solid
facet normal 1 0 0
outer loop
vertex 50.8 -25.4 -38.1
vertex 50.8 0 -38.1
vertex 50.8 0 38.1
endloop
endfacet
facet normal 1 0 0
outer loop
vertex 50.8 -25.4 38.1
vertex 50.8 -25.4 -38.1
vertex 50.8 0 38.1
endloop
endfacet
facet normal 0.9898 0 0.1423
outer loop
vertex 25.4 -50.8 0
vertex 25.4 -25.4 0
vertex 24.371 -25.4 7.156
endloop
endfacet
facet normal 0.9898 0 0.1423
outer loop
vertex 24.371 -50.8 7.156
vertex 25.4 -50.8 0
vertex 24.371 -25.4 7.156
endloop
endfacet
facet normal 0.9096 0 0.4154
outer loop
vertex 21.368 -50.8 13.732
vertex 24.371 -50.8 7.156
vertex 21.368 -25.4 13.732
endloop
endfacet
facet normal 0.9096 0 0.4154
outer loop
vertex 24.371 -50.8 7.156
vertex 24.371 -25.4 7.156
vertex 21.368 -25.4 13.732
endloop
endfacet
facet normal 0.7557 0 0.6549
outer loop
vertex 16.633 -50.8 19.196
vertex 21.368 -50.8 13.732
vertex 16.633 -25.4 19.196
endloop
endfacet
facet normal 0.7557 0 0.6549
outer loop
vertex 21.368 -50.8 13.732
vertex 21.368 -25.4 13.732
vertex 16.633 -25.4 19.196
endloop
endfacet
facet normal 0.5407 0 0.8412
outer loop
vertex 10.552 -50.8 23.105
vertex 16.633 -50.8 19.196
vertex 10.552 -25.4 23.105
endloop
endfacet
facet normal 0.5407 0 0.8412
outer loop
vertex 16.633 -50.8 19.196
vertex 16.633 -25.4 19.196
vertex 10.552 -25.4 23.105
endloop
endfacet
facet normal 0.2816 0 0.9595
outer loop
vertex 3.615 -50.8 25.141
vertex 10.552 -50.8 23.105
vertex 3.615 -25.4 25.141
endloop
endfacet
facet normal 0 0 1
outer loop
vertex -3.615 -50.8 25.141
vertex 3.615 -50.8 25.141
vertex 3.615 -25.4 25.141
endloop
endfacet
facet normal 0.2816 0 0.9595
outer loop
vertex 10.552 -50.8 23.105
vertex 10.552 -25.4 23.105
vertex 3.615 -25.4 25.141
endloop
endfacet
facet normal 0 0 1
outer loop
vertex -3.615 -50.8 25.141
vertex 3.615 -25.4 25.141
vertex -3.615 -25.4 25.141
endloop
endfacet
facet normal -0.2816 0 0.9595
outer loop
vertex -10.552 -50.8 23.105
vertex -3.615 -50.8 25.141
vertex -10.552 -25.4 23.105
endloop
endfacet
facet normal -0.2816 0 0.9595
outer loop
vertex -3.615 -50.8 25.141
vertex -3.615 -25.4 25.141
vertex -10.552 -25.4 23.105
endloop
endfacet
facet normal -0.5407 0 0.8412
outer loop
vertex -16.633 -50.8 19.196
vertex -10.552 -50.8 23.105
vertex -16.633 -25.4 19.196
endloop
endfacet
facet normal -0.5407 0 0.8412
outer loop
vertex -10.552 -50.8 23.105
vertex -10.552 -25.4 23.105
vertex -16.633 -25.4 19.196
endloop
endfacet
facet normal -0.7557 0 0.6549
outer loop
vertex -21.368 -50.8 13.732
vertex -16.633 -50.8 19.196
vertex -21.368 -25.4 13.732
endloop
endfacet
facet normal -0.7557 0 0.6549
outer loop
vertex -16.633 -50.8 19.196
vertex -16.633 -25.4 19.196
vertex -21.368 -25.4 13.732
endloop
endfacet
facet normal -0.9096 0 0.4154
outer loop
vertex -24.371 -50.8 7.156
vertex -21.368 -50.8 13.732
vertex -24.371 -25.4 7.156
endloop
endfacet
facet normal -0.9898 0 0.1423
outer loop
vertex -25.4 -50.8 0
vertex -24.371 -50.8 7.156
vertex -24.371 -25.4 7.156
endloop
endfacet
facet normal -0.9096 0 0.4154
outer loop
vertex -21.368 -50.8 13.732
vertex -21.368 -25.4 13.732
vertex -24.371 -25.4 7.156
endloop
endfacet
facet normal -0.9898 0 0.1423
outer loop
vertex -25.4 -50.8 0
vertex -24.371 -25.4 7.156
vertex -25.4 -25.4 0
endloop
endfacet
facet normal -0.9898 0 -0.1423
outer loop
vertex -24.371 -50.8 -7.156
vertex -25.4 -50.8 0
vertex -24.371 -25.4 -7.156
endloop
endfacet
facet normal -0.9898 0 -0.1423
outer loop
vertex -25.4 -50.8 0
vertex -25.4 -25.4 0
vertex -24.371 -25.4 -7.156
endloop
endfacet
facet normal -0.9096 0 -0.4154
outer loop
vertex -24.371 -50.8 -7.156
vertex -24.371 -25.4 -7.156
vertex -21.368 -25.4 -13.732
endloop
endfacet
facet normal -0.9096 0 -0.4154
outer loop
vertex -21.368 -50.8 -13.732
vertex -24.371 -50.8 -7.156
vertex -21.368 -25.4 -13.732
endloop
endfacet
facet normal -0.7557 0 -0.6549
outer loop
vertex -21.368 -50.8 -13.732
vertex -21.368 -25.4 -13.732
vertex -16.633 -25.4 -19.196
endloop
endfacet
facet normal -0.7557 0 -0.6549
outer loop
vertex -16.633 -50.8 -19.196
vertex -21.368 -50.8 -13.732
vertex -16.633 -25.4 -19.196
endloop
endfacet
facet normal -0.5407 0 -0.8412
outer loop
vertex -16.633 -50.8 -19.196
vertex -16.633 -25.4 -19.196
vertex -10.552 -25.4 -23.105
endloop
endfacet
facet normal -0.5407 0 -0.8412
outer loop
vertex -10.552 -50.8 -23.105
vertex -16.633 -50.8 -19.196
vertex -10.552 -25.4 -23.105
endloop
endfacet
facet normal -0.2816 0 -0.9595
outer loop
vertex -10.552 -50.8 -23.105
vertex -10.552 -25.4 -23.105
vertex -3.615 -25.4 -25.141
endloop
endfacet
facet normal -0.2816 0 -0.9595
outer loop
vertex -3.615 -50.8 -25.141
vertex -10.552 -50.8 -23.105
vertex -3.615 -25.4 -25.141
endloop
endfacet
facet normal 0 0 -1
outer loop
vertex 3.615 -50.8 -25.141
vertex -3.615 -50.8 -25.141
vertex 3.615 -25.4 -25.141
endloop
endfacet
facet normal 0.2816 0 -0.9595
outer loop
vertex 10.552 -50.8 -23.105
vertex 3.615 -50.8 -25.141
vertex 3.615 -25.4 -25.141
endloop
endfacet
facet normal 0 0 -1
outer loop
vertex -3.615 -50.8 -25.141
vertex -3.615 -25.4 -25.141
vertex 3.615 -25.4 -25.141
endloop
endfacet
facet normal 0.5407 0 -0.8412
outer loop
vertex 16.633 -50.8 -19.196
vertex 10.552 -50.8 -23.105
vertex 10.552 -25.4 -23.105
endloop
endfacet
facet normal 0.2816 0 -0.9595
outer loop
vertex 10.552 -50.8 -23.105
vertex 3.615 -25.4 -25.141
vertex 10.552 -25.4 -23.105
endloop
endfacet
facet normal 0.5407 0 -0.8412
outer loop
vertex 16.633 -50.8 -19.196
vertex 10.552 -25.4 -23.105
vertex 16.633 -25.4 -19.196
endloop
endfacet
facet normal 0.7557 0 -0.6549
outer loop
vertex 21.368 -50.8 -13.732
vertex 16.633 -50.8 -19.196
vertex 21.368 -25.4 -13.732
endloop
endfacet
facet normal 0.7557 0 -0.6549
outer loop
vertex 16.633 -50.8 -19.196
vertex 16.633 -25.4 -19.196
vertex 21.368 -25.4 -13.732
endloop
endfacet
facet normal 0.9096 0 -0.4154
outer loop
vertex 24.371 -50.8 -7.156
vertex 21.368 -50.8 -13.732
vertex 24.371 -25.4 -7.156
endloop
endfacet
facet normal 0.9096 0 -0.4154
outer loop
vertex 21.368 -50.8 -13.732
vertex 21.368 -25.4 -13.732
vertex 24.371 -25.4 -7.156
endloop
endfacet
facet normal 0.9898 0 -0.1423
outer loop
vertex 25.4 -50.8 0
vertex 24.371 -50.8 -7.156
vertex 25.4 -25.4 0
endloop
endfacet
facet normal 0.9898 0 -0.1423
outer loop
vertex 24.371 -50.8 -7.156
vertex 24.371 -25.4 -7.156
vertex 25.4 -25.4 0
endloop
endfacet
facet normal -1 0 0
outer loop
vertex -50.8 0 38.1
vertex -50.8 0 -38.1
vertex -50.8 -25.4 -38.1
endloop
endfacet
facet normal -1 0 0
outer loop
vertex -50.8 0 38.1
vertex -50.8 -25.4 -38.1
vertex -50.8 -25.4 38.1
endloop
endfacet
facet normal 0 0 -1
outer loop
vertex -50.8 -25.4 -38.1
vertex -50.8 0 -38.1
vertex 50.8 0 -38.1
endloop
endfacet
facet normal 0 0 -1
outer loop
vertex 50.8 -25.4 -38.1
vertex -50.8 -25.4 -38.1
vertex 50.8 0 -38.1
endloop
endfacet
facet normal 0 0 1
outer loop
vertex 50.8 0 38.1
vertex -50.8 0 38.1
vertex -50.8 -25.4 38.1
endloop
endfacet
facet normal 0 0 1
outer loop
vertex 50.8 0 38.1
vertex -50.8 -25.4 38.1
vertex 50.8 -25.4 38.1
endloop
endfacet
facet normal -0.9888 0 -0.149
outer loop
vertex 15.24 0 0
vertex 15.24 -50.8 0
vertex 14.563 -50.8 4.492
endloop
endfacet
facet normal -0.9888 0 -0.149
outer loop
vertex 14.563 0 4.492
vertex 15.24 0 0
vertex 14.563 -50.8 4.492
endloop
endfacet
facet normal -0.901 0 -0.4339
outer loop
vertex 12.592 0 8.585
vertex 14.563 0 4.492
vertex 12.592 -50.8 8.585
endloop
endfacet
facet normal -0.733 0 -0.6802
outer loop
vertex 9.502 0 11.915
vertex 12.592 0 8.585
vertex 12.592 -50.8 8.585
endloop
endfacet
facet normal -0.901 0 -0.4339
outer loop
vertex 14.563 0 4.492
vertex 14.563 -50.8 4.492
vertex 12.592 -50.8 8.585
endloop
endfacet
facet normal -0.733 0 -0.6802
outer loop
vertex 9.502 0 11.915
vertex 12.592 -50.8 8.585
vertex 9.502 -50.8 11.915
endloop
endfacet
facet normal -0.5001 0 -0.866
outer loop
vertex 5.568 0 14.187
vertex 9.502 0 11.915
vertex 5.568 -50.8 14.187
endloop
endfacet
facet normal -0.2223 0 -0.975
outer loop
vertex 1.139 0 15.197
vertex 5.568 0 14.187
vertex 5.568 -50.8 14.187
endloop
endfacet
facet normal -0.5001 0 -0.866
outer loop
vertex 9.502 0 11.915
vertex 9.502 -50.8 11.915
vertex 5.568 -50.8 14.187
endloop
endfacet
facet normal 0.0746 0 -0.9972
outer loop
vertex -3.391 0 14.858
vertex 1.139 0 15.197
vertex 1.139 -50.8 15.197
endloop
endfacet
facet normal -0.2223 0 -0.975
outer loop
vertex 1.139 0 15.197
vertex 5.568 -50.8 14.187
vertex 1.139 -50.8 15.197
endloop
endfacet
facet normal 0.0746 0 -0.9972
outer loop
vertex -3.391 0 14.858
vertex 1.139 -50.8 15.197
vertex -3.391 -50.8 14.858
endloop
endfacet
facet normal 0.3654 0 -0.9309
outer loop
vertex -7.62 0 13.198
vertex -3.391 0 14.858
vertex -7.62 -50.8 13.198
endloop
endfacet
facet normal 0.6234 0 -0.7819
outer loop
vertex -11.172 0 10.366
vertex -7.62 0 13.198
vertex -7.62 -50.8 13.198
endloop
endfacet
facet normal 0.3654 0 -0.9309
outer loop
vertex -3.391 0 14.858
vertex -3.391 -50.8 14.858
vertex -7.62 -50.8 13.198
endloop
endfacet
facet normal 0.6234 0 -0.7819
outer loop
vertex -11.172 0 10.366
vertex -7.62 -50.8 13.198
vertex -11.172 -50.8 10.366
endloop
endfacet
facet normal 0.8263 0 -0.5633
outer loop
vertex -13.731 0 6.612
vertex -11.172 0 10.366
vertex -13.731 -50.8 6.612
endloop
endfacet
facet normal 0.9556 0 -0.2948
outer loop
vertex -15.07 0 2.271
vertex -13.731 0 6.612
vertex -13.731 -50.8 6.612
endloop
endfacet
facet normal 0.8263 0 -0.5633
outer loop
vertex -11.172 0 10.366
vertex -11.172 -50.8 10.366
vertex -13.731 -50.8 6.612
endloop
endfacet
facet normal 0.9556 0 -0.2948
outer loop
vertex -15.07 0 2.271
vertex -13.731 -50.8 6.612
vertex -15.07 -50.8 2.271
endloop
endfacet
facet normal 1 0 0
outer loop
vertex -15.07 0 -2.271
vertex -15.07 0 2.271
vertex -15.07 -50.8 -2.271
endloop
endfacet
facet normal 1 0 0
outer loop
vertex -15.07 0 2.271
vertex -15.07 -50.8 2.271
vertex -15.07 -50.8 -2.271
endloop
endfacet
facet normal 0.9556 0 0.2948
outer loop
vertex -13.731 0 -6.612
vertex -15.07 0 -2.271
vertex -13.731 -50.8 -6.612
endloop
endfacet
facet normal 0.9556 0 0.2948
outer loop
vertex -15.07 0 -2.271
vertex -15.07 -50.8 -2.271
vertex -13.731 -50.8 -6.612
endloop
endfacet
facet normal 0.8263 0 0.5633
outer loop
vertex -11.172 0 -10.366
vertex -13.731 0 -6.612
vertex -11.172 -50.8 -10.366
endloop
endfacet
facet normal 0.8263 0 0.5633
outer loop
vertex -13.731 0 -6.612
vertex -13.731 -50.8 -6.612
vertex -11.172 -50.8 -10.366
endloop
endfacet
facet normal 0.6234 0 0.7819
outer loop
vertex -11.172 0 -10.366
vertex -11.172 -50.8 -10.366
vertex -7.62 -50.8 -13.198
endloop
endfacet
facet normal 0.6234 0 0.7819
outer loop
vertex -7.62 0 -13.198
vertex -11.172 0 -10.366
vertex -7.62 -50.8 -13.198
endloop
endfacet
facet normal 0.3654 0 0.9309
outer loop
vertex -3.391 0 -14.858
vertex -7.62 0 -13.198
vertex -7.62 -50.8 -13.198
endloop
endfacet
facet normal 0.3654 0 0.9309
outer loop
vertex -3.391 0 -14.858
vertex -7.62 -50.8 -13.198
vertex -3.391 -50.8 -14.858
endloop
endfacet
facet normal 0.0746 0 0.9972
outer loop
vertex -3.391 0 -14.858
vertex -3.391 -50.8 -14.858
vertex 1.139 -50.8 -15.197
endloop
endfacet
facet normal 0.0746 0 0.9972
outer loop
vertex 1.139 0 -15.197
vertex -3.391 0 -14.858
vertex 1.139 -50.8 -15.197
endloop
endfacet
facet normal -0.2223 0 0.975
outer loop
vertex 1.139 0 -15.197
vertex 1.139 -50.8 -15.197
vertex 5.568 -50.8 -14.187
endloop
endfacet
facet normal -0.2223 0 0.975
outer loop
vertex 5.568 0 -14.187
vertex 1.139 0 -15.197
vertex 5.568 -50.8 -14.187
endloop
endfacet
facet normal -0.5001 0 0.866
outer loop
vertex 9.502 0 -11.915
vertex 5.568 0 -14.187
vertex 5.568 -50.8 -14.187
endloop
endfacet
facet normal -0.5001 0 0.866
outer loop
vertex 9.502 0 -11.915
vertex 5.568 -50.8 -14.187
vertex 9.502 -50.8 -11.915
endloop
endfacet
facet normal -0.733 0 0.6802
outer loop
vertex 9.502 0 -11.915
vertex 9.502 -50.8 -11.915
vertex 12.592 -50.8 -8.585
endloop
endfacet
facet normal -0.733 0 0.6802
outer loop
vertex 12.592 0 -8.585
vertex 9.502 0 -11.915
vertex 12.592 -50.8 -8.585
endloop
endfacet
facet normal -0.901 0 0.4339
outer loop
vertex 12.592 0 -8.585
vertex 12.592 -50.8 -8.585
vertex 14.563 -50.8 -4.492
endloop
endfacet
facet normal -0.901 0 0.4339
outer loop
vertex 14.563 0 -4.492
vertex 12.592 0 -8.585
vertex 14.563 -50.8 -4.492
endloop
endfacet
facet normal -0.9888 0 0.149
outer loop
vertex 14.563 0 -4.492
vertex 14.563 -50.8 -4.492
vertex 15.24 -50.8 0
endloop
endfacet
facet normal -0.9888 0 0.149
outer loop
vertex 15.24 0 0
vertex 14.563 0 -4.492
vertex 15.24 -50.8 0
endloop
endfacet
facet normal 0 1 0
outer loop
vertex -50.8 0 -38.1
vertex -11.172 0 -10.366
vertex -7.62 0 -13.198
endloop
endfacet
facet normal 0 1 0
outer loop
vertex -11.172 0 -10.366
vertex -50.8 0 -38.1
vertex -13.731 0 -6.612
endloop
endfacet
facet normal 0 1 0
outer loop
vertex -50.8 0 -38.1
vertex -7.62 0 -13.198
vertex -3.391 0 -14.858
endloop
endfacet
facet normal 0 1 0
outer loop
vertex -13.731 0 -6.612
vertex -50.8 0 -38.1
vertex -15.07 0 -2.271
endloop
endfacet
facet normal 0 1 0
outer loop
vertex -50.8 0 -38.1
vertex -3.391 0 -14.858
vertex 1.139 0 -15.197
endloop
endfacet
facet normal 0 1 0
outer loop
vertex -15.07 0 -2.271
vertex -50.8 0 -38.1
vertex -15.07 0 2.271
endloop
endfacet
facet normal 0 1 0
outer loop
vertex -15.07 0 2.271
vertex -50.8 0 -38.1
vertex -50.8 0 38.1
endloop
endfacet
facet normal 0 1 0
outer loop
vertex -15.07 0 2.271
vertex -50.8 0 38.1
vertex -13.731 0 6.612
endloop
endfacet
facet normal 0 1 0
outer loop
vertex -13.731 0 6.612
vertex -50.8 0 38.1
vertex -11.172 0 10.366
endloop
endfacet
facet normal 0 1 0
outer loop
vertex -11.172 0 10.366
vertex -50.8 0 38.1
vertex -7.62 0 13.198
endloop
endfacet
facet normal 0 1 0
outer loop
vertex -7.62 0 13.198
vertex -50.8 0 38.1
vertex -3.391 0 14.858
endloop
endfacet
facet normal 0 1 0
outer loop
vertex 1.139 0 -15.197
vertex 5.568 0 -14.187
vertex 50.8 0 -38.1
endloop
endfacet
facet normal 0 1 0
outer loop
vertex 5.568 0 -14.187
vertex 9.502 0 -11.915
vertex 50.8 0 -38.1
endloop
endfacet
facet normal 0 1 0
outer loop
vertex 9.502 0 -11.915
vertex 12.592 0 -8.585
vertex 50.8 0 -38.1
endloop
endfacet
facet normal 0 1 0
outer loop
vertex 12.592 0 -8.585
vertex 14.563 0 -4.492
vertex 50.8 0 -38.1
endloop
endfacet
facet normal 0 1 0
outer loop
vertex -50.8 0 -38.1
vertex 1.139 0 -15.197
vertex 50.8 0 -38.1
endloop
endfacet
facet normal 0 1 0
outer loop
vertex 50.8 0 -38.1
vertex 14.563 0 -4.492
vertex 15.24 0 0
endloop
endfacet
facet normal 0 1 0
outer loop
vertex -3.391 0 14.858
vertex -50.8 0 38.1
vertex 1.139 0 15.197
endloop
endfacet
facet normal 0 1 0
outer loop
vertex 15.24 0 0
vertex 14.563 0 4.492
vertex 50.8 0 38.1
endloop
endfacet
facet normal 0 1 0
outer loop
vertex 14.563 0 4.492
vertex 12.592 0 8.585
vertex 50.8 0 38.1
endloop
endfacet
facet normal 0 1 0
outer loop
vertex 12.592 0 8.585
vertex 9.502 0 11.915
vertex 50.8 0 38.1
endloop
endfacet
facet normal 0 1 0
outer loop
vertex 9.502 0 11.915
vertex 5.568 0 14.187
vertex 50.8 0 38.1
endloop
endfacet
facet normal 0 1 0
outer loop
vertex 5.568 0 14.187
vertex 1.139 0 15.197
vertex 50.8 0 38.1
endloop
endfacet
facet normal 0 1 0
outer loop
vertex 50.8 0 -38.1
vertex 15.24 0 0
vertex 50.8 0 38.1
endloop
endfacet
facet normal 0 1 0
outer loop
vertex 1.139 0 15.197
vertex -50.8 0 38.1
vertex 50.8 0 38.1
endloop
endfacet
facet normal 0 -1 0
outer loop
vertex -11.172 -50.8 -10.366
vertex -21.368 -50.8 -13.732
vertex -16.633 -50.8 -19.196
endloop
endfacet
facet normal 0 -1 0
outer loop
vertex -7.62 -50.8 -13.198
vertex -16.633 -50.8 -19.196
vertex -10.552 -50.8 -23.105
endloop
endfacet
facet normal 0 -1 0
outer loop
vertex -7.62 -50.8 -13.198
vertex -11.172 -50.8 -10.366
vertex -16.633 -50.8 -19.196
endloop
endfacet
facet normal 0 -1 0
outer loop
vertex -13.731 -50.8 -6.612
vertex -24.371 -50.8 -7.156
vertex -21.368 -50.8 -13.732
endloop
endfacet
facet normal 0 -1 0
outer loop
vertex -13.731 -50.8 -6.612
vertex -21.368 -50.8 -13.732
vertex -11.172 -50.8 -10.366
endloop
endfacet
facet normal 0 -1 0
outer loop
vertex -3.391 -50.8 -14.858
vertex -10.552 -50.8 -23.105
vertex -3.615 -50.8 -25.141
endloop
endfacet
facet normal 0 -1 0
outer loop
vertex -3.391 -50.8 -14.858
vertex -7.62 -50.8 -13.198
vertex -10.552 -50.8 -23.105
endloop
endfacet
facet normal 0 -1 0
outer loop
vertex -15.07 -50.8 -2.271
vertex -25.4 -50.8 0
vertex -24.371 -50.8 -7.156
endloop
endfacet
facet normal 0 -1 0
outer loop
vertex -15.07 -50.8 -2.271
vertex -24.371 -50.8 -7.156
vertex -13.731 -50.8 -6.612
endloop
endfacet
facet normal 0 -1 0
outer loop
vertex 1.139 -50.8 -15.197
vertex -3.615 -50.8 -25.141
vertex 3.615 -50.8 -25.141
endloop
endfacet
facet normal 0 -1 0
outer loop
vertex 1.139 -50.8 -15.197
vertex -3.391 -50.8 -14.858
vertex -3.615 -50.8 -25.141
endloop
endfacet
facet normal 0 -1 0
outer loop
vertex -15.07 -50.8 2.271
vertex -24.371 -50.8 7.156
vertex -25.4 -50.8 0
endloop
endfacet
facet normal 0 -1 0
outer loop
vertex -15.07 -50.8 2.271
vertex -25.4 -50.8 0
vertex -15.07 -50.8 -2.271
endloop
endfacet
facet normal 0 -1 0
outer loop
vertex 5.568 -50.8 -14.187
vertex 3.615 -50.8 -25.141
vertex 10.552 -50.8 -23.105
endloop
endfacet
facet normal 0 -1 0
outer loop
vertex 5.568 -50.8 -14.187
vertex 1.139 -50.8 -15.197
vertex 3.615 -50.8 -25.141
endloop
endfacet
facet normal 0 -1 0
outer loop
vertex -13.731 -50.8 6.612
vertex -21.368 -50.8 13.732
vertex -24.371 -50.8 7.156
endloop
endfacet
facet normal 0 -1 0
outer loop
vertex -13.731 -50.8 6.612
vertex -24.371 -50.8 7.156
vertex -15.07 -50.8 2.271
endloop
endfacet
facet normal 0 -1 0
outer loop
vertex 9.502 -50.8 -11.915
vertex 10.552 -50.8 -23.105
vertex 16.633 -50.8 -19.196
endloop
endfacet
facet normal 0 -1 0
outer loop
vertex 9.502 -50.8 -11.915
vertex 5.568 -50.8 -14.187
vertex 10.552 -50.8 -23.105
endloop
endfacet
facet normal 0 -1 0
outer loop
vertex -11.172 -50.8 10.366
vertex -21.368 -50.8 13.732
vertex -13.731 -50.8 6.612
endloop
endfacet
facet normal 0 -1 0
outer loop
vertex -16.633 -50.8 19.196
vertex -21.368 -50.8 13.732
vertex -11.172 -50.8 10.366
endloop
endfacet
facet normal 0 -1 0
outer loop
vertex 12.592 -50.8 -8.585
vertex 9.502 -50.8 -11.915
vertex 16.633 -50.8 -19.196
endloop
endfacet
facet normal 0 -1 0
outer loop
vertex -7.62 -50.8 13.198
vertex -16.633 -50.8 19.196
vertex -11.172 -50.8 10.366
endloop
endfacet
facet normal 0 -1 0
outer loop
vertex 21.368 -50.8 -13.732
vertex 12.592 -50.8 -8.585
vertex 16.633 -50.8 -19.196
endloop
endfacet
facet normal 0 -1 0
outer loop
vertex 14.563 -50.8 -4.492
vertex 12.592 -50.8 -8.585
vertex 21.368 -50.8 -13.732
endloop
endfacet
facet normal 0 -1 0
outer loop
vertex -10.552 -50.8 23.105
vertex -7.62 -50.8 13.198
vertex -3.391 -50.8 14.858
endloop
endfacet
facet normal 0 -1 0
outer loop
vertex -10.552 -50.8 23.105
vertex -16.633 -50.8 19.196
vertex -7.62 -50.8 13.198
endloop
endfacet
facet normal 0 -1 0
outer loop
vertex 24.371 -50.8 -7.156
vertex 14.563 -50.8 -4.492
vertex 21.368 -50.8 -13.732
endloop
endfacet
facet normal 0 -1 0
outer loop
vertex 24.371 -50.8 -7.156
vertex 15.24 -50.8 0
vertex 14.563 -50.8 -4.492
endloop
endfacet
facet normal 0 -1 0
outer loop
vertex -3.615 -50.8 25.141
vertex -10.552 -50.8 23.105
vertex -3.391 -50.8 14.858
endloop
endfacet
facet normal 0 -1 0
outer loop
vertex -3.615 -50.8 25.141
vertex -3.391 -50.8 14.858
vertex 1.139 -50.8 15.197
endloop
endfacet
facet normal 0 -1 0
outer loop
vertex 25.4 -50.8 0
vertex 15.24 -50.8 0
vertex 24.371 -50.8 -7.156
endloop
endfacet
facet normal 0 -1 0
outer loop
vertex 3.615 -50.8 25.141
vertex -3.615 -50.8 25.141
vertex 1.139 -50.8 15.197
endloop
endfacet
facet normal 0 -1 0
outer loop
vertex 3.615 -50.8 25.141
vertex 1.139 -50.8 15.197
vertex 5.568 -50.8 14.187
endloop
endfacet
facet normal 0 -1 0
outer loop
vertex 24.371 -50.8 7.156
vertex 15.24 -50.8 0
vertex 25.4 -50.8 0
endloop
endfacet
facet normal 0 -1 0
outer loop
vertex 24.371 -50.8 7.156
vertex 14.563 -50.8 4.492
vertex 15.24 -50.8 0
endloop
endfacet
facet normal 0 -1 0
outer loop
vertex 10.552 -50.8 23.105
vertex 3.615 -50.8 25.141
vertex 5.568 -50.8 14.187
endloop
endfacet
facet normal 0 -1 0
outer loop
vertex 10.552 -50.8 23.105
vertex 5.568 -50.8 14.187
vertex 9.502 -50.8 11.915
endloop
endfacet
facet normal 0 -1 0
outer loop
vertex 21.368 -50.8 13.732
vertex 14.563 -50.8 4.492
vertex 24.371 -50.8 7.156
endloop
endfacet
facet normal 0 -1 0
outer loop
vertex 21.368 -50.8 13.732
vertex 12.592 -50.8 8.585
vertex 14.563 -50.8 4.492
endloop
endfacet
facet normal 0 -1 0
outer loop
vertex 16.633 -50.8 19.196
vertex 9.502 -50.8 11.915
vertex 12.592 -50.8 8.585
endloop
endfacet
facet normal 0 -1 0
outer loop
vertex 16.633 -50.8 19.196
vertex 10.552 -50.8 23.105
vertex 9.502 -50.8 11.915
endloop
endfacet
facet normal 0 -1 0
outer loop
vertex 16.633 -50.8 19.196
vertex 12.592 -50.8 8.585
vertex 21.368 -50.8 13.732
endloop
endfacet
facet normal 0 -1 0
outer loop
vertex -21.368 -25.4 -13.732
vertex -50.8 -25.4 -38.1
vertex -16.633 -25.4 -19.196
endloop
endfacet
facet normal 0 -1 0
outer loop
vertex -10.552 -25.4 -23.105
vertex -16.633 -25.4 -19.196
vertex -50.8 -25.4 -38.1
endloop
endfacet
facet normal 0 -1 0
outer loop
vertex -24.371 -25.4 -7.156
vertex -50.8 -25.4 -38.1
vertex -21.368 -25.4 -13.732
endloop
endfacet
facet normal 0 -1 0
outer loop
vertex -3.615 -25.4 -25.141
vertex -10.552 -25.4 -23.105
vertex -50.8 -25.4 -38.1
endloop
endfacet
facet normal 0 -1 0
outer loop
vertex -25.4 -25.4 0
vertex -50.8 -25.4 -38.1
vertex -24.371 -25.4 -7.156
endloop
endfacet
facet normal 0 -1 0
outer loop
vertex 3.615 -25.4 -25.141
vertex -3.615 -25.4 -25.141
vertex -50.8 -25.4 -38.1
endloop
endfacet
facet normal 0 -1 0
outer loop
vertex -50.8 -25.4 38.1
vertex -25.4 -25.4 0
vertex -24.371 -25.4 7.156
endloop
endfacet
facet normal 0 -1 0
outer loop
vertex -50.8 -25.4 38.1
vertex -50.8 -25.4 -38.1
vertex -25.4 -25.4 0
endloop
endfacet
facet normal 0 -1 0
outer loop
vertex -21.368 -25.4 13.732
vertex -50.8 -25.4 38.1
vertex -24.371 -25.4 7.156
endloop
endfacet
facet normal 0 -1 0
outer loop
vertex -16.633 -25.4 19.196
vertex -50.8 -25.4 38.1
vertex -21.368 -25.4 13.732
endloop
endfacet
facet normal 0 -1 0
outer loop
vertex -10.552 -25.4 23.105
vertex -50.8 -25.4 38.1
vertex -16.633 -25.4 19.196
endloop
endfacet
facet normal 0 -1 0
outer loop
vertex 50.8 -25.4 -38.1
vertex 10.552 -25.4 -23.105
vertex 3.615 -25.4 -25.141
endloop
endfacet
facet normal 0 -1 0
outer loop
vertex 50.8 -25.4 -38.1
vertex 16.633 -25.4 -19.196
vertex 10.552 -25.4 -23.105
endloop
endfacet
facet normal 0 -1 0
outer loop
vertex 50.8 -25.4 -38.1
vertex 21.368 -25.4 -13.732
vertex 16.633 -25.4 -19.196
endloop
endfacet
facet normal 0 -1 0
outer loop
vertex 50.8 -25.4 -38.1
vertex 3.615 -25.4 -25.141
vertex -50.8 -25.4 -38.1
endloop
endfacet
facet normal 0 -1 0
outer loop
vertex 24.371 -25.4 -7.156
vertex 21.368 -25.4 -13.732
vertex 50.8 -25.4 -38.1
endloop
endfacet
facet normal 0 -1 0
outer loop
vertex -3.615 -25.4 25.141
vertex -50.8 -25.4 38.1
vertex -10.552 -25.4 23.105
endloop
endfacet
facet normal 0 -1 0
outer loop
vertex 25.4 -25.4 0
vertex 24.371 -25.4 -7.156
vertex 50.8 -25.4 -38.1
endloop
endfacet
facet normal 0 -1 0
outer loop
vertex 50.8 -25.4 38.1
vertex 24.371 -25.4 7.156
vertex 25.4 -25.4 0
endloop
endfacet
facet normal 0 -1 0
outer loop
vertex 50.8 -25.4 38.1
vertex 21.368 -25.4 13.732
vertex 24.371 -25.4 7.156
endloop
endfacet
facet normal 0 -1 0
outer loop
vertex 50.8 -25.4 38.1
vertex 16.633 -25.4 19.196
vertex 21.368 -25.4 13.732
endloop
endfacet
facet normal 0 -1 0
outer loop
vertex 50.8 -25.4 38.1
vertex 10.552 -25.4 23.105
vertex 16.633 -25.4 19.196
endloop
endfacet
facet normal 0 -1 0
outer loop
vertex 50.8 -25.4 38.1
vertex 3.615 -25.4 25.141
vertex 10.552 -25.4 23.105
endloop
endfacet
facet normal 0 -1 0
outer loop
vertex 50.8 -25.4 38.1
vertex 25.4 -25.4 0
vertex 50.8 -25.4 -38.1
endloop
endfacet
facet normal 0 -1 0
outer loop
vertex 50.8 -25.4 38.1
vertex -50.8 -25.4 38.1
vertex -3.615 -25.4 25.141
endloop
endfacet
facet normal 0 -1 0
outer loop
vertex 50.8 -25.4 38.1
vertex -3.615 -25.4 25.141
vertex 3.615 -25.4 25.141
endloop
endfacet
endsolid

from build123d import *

# Parameters (mm, degrees)
F0_W     = 101.6
F0_H     = 76.2
F1_DEPTH = 25.4
F2_R     = 25.4
F3_DEPTH = 25.4
F4_R     = 15.24
F5_DEPTH = 61.722


with BuildPart() as f1:
    # F0 (on Front) → F1 (new body)
    with BuildSketch(Plane.XZ):
        Rectangle(F0_W, F0_H)
    extrude(amount=F1_DEPTH)

    # F2 (on face) → F3 (join)
    with BuildSketch(Plane.XZ.offset(25.4)):
        Circle(F2_R)
    extrude(amount=F3_DEPTH)

    # F4 (on face) → F5 (cut)
    with BuildSketch(Plane.XZ.offset(50.8)):
        Circle(F4_R)
    extrude(amount=-F5_DEPTH, mode=Mode.SUBTRACT)


solid = f1.part
